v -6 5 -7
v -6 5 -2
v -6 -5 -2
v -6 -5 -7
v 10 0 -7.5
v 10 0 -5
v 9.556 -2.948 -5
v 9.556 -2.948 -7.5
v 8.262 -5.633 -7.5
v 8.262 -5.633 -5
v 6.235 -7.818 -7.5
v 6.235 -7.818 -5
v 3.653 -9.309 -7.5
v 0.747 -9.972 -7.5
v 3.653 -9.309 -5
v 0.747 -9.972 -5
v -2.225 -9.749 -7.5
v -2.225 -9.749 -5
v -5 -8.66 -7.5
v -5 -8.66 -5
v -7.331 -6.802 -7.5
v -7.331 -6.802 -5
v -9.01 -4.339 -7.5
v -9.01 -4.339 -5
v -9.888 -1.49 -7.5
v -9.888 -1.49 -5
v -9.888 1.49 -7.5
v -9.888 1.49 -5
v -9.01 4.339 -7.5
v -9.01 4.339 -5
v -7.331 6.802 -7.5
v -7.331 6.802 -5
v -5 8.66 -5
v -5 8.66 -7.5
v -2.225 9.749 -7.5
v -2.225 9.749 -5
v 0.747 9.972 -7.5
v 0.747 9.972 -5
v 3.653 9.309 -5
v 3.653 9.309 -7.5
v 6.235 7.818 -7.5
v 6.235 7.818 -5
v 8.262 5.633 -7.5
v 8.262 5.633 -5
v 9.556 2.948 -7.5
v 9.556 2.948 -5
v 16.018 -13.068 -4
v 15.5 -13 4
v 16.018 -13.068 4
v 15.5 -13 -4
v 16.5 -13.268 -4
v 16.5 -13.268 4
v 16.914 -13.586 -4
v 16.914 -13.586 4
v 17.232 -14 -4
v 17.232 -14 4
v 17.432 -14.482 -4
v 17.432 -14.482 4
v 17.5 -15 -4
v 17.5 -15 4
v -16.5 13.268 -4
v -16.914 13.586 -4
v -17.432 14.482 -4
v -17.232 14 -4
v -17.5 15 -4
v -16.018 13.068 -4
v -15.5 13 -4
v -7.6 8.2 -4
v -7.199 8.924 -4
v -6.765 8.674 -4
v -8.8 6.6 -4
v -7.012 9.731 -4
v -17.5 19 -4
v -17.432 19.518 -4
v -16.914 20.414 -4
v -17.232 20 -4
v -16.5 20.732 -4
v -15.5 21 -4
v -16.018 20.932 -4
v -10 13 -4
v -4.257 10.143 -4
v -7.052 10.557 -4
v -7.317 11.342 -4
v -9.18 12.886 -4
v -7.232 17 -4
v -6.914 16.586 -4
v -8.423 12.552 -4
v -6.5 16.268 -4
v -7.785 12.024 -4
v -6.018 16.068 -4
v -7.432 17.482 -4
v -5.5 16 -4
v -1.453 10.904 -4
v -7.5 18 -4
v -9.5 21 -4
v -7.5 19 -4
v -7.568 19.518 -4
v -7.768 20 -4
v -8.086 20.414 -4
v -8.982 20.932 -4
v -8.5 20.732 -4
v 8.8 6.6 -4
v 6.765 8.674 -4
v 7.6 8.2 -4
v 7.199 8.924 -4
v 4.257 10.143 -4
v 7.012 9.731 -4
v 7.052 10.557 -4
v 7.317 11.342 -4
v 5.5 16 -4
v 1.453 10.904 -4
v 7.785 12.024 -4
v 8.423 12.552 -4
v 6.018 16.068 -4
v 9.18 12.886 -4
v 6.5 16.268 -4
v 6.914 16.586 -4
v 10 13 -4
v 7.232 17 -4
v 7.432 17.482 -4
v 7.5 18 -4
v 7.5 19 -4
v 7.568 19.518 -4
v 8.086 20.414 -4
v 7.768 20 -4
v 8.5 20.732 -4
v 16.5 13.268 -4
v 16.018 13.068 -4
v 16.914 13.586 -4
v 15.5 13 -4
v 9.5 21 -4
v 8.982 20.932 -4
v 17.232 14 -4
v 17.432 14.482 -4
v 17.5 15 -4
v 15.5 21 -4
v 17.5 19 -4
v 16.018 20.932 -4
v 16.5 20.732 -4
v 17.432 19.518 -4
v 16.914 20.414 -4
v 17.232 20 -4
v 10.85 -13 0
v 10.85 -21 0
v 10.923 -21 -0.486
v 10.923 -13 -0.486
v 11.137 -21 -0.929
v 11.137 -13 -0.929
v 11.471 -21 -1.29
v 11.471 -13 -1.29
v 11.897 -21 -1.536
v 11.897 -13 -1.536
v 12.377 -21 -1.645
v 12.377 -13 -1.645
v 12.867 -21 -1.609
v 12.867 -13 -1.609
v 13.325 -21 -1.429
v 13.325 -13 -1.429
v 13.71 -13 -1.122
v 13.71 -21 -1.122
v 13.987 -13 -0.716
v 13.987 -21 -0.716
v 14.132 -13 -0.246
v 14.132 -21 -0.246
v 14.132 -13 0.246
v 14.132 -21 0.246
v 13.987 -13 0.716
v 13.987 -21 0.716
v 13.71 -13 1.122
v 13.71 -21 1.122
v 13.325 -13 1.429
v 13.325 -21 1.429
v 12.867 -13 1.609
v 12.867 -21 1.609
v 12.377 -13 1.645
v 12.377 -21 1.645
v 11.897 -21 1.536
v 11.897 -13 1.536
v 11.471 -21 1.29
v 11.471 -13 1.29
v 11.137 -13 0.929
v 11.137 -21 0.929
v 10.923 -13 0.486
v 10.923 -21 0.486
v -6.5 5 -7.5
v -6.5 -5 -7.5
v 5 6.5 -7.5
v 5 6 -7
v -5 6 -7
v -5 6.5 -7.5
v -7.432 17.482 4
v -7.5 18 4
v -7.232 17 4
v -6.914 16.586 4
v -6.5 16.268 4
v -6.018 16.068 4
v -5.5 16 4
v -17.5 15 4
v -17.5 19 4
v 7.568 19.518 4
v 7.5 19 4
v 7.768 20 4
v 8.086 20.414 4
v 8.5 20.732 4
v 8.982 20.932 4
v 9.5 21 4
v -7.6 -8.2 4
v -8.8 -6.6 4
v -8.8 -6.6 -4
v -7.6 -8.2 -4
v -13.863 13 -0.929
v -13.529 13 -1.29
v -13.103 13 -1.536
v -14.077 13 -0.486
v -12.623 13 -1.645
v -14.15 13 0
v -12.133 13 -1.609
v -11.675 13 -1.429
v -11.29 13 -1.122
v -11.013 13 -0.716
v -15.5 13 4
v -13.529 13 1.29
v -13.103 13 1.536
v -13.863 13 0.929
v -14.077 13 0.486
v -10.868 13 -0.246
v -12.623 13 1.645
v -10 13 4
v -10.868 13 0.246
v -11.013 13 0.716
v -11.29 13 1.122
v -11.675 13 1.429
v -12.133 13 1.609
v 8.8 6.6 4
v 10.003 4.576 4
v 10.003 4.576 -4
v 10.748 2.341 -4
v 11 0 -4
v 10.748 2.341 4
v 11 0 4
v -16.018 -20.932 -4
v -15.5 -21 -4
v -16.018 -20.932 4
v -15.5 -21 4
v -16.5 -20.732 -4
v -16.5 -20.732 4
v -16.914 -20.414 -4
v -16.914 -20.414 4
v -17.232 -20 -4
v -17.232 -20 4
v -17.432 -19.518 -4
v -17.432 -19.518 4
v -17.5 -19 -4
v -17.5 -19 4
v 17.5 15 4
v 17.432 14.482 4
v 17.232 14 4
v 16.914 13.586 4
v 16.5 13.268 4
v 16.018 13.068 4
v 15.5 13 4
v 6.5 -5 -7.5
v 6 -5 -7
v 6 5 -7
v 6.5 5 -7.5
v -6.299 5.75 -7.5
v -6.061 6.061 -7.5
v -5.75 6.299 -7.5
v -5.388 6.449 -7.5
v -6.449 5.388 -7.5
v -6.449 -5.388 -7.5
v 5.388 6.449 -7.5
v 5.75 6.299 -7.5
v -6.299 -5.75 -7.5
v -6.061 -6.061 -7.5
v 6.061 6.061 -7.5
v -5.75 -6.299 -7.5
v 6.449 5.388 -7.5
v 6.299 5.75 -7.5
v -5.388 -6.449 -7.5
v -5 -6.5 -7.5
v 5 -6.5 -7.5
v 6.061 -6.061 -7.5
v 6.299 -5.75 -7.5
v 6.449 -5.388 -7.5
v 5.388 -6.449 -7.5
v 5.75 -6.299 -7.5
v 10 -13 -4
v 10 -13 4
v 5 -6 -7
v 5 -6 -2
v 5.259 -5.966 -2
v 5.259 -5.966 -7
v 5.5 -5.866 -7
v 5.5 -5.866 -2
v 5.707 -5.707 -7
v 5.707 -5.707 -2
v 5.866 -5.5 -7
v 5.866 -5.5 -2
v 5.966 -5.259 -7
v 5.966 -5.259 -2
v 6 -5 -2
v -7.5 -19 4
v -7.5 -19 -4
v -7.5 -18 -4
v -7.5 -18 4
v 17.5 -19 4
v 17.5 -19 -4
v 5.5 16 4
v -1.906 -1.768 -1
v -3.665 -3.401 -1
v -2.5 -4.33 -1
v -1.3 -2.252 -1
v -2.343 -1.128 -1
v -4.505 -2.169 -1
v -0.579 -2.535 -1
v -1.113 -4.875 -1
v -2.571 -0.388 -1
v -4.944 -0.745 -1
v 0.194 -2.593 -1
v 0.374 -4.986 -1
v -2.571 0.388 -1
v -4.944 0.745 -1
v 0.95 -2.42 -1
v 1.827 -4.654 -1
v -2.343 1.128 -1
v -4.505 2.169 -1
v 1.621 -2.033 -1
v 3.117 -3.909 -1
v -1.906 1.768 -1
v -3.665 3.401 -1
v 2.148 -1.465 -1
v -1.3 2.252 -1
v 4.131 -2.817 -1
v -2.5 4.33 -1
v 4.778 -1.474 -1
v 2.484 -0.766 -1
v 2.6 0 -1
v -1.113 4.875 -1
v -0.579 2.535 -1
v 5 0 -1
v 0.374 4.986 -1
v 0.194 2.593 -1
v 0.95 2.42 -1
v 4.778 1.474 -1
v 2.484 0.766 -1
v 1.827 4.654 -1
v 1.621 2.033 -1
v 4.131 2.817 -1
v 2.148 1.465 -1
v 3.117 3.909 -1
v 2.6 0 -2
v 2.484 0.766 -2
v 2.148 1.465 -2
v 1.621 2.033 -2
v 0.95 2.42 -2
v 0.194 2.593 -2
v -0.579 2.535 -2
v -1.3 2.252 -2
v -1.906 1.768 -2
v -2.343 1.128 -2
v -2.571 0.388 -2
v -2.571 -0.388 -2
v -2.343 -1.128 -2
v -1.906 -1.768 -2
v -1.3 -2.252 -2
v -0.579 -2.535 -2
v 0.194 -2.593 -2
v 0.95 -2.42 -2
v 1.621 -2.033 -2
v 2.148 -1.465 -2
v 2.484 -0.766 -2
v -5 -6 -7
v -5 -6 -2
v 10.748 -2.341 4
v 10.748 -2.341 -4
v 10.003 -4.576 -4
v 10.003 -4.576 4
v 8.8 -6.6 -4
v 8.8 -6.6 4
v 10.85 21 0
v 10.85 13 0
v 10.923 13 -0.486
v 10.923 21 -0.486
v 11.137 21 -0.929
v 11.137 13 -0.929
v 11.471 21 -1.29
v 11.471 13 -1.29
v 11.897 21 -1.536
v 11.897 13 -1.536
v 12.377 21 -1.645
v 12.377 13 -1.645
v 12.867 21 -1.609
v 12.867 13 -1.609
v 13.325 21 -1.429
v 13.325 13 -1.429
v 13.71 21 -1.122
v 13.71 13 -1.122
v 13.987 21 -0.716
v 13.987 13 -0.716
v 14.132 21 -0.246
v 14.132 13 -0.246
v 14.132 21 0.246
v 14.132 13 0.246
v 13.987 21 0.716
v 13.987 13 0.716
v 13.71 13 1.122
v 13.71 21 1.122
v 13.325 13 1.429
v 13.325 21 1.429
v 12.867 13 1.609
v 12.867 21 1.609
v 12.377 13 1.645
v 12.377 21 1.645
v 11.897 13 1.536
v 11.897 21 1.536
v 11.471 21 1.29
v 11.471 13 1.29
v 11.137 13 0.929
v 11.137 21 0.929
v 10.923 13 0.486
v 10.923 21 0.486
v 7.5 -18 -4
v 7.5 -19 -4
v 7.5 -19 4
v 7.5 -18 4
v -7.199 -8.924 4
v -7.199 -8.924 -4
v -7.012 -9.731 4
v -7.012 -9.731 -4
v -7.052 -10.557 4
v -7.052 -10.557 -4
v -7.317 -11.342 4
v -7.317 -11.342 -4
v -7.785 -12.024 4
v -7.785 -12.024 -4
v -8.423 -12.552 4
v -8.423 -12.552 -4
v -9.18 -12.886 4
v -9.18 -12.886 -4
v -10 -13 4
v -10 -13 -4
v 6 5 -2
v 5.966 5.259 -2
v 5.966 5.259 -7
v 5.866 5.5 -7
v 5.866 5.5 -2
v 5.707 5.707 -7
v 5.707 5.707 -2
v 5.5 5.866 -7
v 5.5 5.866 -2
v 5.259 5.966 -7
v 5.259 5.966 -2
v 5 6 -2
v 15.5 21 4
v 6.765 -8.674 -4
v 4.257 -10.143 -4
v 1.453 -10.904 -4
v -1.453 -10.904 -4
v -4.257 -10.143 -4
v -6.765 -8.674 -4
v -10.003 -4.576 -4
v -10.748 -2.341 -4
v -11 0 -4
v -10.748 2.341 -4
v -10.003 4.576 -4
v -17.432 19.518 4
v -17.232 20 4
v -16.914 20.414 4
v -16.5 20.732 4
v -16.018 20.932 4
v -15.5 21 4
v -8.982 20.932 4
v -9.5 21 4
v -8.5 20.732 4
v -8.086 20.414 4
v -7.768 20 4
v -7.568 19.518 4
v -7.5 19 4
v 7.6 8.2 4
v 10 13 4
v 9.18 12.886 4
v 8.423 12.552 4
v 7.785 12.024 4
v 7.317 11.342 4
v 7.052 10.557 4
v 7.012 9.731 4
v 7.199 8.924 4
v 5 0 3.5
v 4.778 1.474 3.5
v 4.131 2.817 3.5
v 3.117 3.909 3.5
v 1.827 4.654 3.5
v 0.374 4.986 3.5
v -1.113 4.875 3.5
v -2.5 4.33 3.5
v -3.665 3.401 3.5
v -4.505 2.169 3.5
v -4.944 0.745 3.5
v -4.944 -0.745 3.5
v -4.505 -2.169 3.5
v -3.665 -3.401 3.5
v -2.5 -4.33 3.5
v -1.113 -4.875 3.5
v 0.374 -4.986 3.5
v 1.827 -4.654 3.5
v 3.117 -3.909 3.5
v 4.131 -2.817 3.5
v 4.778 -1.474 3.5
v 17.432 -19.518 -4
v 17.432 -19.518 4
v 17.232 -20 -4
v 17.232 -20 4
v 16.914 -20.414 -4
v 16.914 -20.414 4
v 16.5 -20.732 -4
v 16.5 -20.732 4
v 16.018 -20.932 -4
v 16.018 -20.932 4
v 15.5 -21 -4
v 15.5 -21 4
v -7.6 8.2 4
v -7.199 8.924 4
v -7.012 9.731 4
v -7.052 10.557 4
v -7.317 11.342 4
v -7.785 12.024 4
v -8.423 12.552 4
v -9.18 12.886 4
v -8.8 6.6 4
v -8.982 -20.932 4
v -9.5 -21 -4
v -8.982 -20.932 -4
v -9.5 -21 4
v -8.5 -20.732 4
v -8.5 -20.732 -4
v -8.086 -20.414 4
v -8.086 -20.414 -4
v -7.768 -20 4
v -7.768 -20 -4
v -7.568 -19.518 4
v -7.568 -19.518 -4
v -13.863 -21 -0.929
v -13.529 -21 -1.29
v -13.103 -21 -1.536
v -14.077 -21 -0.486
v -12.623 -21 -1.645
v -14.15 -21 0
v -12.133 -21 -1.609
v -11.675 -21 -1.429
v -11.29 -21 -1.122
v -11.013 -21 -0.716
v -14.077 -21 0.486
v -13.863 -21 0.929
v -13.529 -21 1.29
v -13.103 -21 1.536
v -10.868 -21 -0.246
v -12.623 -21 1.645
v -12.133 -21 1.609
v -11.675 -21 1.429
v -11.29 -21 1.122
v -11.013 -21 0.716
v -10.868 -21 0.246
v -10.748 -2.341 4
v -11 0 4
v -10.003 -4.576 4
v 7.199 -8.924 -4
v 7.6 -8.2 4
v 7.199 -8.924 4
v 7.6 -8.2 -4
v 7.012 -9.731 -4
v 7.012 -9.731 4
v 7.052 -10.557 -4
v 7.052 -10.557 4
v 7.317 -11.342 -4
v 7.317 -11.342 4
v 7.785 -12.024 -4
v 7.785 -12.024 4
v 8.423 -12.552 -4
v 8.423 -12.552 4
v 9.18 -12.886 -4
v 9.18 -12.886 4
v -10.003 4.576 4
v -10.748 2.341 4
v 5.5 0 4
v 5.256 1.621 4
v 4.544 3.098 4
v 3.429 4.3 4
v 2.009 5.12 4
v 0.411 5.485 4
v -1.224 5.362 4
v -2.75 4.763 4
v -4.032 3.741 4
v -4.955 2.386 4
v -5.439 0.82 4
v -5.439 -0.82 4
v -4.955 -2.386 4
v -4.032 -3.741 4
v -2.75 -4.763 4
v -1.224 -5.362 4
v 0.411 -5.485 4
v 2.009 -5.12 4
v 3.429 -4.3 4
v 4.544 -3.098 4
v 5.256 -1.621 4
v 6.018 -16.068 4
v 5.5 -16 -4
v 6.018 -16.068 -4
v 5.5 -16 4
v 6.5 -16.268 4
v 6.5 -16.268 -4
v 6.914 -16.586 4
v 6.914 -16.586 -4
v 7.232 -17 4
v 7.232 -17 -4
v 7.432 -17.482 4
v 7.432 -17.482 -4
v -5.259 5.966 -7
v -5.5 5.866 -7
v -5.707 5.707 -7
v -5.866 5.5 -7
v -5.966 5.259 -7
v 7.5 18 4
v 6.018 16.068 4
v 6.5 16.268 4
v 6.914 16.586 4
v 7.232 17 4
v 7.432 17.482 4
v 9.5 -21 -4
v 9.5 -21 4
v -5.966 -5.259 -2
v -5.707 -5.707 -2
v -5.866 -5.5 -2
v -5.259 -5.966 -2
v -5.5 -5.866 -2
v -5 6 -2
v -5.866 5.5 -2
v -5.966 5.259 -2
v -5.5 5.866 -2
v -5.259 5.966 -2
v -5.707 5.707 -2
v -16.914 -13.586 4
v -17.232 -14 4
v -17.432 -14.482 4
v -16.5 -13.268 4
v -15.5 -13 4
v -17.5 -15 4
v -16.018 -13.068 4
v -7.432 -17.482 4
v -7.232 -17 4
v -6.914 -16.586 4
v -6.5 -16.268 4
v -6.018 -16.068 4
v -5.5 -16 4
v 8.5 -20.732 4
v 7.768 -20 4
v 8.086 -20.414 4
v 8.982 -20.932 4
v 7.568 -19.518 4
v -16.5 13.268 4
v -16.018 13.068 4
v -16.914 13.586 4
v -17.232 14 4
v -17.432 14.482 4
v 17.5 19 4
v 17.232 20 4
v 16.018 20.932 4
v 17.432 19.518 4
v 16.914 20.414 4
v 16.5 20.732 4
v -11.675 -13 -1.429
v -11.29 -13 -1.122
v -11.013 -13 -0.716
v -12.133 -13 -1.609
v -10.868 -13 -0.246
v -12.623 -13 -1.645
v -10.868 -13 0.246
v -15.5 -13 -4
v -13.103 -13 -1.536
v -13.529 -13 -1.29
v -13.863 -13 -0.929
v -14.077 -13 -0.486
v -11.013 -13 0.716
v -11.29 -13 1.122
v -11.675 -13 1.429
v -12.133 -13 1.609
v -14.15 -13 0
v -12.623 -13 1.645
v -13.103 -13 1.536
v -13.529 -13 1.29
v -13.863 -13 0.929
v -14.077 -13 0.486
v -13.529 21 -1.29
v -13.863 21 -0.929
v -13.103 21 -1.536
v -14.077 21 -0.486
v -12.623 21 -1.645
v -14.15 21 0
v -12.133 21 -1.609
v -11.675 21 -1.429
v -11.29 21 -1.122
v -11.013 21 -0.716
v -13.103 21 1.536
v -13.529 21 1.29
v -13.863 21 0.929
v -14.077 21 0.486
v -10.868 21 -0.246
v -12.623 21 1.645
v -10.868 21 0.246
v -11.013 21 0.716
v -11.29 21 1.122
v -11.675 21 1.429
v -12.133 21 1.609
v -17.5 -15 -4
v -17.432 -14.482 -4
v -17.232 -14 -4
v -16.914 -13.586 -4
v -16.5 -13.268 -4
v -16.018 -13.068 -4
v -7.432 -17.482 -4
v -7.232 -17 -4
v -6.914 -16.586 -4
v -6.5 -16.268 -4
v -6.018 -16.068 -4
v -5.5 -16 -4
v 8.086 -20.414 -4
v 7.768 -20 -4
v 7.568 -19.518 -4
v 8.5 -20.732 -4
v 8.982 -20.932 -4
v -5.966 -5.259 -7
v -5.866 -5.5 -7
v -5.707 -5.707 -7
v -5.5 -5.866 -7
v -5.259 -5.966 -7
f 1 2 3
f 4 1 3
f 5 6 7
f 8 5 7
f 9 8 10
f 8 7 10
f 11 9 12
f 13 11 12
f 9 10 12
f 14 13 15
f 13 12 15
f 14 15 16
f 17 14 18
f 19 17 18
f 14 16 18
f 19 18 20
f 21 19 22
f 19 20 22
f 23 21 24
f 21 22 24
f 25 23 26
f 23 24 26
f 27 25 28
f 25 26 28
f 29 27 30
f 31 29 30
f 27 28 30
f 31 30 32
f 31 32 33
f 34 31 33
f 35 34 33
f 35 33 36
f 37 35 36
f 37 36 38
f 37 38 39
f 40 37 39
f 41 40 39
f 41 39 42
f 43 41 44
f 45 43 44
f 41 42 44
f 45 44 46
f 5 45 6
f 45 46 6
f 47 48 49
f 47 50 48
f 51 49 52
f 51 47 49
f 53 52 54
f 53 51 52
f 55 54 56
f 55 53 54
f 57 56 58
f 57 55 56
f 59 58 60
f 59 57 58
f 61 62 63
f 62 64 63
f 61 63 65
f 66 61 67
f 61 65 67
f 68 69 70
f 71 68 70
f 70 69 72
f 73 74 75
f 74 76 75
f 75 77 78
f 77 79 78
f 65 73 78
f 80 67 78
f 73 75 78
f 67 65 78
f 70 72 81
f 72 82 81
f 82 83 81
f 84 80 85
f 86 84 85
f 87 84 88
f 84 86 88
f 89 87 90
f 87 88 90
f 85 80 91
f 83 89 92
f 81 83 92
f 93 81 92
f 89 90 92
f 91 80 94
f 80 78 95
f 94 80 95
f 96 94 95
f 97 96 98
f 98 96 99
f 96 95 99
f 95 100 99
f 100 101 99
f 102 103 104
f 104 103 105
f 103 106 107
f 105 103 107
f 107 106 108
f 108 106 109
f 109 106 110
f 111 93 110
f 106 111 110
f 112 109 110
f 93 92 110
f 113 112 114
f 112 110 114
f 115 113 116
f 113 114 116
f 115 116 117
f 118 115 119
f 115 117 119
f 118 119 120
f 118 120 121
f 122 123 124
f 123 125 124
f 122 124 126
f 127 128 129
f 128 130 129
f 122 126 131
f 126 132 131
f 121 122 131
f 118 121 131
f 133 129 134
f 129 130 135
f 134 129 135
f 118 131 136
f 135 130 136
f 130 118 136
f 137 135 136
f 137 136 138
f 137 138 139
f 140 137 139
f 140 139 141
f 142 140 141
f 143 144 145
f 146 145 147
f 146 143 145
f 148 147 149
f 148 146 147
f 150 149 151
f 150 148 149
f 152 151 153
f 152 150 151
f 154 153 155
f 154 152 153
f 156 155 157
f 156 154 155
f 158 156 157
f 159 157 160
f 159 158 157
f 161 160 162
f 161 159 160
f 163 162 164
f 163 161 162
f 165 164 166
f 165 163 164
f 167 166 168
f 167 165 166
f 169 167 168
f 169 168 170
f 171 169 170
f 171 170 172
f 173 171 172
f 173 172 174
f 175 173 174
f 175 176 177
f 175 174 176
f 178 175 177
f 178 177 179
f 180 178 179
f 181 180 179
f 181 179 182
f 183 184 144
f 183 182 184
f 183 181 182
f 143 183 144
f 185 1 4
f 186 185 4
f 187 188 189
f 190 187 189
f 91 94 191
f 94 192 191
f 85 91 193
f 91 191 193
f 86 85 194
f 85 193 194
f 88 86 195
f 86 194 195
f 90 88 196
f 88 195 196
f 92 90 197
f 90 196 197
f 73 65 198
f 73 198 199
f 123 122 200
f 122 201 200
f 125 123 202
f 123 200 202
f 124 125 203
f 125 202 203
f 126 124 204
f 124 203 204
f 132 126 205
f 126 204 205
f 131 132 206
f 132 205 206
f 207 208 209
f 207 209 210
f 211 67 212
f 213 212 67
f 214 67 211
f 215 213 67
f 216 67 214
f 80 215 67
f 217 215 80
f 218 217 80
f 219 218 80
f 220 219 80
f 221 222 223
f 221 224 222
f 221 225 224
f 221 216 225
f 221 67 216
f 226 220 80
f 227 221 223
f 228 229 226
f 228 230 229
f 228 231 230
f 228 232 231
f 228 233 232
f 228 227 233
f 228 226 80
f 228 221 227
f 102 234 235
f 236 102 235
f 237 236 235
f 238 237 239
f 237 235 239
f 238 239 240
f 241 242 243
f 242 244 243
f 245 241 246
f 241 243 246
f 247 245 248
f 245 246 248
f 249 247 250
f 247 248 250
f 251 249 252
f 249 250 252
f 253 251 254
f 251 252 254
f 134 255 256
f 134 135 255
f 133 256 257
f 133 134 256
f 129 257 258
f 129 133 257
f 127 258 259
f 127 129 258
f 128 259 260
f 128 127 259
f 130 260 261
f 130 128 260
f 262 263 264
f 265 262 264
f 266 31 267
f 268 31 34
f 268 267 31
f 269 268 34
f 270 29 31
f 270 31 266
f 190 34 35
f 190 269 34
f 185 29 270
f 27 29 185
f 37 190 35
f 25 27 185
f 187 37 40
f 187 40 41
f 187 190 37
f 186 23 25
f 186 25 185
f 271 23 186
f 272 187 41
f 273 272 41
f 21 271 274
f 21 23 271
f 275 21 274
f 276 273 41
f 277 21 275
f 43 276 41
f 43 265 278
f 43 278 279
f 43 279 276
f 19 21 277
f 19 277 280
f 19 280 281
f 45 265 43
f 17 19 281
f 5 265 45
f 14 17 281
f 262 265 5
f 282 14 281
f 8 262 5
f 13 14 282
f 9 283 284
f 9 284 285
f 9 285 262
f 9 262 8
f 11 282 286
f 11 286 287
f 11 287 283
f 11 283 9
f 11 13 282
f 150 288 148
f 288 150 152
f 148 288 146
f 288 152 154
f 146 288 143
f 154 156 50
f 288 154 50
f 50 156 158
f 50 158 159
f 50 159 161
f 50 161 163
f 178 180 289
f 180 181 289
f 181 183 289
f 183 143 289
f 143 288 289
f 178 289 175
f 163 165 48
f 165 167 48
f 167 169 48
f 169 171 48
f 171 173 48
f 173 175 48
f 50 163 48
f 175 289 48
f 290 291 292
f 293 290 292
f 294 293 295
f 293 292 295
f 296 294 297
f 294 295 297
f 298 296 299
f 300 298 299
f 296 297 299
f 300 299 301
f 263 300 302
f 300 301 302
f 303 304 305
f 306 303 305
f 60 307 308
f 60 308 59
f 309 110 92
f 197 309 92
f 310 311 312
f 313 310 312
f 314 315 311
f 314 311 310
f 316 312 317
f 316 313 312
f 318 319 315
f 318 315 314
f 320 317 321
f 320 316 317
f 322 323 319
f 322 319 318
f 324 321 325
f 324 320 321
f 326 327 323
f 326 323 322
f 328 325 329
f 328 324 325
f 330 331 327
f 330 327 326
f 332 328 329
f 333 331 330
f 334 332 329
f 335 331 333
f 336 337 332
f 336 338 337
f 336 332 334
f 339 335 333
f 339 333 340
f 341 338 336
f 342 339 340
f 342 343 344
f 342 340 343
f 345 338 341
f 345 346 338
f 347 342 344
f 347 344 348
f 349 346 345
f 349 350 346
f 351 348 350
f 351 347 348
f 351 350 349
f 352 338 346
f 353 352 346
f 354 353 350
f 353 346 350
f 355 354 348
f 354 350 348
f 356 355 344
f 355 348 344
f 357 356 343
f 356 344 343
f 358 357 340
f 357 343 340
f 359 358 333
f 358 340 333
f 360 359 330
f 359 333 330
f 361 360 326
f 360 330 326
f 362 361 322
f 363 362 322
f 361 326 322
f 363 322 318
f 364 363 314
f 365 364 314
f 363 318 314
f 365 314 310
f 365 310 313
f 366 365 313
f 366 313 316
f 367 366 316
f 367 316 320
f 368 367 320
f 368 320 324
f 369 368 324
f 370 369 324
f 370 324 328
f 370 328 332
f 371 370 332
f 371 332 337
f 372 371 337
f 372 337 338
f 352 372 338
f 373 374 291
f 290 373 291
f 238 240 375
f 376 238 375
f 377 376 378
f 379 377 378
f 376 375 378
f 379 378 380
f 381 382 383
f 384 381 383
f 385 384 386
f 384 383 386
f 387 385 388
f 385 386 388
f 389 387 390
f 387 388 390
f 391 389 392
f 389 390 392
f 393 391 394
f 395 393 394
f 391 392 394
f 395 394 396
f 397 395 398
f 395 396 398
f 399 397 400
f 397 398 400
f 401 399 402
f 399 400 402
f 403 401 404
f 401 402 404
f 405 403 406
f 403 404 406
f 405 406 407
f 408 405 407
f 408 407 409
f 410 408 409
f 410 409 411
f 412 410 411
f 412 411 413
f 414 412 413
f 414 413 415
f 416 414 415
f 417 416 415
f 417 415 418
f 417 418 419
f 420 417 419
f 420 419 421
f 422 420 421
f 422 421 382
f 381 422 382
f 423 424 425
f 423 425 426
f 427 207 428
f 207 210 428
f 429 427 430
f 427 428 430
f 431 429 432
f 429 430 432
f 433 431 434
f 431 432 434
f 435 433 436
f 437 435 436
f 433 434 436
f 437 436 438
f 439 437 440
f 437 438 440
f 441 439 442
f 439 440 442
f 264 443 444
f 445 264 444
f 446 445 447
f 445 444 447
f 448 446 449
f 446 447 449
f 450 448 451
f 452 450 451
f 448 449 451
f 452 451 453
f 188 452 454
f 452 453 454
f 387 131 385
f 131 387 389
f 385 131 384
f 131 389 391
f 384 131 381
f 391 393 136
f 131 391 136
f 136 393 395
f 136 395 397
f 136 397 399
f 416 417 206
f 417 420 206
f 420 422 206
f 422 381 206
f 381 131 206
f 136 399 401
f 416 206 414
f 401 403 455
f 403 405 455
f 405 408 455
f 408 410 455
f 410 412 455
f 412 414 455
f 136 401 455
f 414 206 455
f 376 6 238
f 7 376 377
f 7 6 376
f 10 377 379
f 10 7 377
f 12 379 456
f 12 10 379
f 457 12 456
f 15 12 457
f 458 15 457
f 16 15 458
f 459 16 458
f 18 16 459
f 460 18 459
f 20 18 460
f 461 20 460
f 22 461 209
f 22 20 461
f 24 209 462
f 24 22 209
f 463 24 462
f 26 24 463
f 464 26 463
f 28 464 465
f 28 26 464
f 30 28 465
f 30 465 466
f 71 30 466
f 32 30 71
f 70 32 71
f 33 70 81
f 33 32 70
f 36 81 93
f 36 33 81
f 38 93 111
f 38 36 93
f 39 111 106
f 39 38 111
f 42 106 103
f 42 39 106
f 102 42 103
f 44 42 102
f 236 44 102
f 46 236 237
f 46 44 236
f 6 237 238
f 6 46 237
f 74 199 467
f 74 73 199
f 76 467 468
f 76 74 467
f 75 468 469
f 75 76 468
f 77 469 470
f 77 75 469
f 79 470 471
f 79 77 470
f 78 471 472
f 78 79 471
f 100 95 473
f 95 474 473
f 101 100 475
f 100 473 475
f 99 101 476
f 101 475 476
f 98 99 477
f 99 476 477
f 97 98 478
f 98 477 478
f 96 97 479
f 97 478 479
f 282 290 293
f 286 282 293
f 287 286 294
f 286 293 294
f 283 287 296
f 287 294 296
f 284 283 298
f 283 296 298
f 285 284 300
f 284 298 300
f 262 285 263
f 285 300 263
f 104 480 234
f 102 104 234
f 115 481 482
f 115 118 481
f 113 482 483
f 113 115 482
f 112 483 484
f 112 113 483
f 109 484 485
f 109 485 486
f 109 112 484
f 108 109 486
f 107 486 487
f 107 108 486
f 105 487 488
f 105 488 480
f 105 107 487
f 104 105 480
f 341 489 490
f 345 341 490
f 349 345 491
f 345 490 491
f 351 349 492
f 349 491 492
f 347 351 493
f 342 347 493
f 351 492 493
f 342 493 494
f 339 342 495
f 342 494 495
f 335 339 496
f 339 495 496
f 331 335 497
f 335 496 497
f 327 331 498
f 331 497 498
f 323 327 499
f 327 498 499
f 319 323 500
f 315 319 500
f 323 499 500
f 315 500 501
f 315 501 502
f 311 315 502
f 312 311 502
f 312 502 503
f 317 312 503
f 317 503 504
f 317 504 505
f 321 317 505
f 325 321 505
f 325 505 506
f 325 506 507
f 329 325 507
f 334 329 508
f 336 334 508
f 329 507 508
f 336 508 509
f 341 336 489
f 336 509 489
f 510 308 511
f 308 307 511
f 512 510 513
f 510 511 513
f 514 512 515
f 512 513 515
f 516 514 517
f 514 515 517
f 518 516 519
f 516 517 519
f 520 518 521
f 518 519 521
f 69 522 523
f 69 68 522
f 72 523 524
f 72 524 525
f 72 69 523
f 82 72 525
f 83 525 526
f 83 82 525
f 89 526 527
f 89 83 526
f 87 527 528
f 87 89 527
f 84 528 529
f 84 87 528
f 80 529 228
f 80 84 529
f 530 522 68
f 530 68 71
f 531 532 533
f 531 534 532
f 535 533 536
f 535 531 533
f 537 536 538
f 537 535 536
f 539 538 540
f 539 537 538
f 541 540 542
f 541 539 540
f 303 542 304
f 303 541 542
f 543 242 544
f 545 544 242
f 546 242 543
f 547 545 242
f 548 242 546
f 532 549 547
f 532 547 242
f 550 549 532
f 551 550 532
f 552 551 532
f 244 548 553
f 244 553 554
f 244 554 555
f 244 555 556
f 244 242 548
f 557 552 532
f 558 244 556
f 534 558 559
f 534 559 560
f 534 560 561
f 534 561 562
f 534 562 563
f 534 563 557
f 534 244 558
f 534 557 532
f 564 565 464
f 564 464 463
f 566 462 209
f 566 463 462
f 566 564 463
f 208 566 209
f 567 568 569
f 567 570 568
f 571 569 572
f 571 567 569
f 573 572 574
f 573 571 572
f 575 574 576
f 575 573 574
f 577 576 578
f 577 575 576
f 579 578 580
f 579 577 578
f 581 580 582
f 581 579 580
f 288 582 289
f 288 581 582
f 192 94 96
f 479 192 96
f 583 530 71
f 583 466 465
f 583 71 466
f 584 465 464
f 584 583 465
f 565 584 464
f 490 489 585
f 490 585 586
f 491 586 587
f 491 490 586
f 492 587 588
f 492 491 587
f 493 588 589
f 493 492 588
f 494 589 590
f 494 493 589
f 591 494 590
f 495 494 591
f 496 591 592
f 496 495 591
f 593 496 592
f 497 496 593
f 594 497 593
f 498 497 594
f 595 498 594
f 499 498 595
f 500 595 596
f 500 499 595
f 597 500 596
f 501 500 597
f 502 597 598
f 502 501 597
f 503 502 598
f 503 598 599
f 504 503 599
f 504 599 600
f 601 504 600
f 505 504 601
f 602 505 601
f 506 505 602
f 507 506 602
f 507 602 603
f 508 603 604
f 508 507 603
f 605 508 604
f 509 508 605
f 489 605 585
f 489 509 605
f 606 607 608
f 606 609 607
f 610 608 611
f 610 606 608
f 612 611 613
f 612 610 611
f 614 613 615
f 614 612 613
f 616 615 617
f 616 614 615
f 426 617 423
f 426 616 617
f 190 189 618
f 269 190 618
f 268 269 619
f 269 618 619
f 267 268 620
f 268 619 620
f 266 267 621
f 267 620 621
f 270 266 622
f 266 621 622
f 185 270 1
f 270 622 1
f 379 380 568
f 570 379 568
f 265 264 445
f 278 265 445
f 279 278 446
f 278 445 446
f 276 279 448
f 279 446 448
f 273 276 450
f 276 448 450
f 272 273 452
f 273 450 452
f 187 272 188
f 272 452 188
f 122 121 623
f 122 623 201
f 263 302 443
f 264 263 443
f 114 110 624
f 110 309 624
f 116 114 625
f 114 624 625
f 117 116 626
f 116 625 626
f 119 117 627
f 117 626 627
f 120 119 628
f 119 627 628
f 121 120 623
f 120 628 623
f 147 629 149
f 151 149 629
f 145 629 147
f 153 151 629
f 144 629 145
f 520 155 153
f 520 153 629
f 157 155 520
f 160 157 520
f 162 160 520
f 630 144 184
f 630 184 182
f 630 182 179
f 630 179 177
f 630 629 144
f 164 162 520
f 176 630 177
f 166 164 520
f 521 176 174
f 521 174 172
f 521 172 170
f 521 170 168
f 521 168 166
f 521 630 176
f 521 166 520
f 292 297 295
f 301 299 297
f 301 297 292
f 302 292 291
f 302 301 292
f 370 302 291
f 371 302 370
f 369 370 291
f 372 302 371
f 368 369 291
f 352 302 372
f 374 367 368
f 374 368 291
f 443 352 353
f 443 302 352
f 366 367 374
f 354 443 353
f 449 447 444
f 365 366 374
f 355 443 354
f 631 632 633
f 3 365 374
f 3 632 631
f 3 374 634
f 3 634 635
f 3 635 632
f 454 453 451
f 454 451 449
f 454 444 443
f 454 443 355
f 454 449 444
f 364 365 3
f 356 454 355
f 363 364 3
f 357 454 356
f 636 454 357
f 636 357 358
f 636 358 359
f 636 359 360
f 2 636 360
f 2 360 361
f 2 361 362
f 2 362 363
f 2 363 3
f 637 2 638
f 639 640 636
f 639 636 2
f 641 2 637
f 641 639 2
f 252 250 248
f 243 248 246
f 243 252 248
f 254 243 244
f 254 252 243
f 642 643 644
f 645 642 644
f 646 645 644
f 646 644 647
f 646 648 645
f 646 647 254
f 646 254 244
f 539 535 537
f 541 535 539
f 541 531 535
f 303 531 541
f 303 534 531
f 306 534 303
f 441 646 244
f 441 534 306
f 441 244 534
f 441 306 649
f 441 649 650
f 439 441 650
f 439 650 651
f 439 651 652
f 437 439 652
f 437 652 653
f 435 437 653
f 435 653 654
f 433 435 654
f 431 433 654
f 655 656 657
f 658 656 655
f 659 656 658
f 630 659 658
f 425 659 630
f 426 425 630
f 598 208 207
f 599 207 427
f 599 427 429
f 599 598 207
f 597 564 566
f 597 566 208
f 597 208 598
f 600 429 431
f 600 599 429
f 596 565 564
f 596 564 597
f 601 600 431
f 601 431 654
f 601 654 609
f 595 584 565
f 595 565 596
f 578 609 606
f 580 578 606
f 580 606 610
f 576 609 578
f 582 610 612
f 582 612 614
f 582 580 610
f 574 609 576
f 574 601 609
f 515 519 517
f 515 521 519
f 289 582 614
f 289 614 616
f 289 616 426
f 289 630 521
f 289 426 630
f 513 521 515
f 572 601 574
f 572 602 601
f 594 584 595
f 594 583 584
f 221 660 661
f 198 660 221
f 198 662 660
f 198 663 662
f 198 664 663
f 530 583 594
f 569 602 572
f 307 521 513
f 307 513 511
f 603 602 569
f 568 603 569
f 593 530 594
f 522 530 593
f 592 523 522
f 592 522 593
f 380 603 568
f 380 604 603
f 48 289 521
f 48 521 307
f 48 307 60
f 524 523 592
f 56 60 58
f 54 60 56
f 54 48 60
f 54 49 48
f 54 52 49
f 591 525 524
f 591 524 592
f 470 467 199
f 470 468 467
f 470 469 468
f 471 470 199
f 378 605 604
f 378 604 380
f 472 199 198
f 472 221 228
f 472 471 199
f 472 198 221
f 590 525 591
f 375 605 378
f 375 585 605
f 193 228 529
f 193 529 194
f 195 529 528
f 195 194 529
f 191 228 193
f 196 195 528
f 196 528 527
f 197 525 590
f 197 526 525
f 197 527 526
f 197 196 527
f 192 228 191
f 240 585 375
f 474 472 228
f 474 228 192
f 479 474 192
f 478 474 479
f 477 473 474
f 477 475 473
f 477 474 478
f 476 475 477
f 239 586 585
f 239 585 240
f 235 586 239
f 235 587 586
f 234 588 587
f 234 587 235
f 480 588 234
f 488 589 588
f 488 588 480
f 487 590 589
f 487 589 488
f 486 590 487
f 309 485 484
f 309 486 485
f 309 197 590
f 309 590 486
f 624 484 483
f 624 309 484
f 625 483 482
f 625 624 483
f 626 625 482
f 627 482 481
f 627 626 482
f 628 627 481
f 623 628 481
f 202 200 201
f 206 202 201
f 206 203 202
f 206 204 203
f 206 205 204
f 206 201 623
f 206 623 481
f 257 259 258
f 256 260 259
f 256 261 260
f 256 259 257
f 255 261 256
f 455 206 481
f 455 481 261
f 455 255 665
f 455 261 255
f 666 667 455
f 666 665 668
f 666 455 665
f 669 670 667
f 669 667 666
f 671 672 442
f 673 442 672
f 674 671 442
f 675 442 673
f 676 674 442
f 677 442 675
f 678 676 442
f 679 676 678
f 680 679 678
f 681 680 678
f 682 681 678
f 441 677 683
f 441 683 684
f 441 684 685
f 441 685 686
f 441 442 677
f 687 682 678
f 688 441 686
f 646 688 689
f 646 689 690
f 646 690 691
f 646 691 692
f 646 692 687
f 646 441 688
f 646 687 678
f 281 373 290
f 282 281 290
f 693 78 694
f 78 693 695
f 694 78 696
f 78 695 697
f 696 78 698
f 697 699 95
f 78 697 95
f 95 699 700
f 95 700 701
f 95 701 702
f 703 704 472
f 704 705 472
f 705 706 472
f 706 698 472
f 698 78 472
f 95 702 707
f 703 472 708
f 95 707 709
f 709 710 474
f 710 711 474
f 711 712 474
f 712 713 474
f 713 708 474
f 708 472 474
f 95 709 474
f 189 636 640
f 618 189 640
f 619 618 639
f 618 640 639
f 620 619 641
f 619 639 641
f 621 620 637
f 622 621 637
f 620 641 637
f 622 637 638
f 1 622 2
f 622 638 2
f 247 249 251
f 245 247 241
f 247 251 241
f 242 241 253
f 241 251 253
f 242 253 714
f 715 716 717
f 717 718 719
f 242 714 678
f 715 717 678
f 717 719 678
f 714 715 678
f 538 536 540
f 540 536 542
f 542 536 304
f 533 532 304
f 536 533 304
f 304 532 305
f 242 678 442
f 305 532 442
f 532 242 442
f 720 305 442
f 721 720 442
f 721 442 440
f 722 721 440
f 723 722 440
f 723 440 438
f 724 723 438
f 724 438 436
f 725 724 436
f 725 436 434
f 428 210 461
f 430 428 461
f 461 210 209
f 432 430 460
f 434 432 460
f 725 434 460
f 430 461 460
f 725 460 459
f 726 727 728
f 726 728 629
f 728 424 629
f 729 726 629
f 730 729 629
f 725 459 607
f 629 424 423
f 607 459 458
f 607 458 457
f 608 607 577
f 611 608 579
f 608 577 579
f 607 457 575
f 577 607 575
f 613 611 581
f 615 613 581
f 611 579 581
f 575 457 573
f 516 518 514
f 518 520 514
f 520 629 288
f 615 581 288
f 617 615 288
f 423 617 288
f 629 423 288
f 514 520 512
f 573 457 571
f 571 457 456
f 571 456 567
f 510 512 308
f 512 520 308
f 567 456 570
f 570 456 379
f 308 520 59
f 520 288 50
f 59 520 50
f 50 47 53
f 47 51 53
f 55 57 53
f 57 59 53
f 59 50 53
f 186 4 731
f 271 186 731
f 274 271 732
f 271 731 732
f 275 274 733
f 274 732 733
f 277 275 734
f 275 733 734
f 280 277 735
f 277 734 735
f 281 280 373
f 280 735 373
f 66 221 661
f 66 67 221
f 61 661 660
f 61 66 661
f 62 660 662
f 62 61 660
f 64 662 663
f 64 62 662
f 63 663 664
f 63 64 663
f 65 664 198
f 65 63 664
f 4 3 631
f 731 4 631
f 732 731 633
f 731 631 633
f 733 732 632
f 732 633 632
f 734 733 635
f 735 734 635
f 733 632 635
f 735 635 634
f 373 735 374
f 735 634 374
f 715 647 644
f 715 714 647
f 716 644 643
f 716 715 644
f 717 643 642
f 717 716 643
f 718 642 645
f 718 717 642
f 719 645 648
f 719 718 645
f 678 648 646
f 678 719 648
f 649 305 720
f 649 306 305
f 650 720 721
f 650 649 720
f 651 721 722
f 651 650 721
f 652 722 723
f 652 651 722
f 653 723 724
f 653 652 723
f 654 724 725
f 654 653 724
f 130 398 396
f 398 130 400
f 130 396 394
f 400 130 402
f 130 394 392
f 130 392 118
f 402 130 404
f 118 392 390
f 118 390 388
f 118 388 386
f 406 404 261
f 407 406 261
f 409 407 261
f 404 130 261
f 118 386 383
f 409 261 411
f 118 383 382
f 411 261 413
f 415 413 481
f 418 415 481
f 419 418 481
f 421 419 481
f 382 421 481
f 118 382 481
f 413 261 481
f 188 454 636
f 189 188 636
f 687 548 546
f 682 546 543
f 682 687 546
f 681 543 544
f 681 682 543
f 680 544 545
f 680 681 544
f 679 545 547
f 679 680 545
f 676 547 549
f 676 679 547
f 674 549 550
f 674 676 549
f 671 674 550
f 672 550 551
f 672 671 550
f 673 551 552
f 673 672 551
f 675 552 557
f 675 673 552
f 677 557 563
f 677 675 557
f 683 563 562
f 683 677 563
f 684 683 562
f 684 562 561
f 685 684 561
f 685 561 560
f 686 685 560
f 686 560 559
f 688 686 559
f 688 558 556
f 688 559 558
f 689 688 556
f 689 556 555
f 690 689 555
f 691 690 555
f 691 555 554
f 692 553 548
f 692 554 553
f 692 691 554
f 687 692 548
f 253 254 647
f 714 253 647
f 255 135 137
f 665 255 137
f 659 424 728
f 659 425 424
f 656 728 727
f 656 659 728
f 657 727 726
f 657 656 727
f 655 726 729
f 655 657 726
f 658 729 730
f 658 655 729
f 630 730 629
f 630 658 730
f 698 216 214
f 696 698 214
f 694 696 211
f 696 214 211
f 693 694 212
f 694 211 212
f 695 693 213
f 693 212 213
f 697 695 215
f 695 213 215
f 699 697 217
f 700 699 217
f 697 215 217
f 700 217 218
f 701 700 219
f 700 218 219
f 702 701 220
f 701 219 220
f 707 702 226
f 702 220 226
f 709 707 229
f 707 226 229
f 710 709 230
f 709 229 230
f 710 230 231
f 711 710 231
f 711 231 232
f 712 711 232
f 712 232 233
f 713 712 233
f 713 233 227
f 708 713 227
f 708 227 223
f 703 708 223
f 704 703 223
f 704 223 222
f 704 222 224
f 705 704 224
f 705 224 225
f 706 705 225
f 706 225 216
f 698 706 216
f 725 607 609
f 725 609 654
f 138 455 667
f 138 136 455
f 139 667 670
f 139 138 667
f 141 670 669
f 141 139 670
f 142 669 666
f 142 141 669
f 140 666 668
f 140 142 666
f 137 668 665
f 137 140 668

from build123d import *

# Parameters (mm, degrees)
SKETCH_1_W             = 35
SKETCH_1_H             = 42
EXTRUDE_1_DEPTH        = 4
SKETCH_4_R             = 10
EXTRUDE_2_DEPTH        = 3.5
CUT_EXTRUDE_START      = -2
CUT_EXTRUDE_2_DEPTH    = 2
SKETCH_6_R             = 2.6
CUT_EXTRUDE_3_DEPTH    = 30.656365253
SKETCH_7_R             = 5
CUT_EXTRUDE_4_DEPTH    = 5
CHAMFER_1_SIZE         = 0.5
CHAMFER_2_SIZE         = 0.5
CHAMFER_3_SIZE         = 1
CUT_EXTRUDE_5_DEPTH    = 30.656365253
FILLET_1_R             = 3
HOLE_WIZARD_M4_1_D     = 3.3
HOLE_WIZARD_M4_1_DEPTH = 8
SKETCH_14_W            = 15
SKETCH_14_H            = 5
CUT_EXTRUDE_6_DEPTH    = 29.482450737
FILLET_2_R             = 2
FILLET_3_R             = 2


with BuildPart() as part:
    # 草图1 → 凸台-拉伸1 (new, symmetric)
    with BuildSketch(Plane.XY):
        Rectangle(SKETCH_1_W, SKETCH_1_H)
    extrude(amount=EXTRUDE_1_DEPTH, both=True)

    # 草图4 → 凸台-拉伸2 (add)
    with BuildSketch(Plane(origin=(0, 0, -4), x_dir=(-1, 0, 0), z_dir=(0, 0, -1))):
        with Locations(Location((0, 0, 0), (0, 0, 180))):
            Circle(SKETCH_4_R)
        with BuildLine():
            Line((-5, 6), (5, 6))
            ThreePointArc((5, 6), (5.707106781, 5.707106781), (6, 5))
            Line((6, 5), (6, -5))
            ThreePointArc((6, -5), (5.707106781, -5.707106781), (5, -6))
            Line((5, -6), (-5, -6))
            ThreePointArc((-5, -6), (-5.707106781, -5.707106781), (-6, -5))
            Line((-6, -5), (-6, 5))
            ThreePointArc((-6, 5), (-5.707106781, 5.707106781), (-5, 6))
        make_face(mode=Mode.SUBTRACT)
    extrude(amount=EXTRUDE_2_DEPTH)

    # 草图5 → 切除-拉伸2 (cut)
    with BuildSketch(Plane(origin=(0, 0, -4), x_dir=(-1, 0, 0), z_dir=(0, 0, -1)).offset(CUT_EXTRUDE_START)):
        with BuildLine():
            Line((6, -5), (6, 5))
            ThreePointArc((6, 5), (5.707106781, 5.707106781), (5, 6))
            Line((5, 6), (-5, 6))
            ThreePointArc((-5, 6), (-5.707106781, 5.707106781), (-6, 5))
            Line((-6, 5), (-6, -5))
            ThreePointArc((-6, -5), (-5.707106781, -5.707106781), (-5, -6))
            Line((-5, -6), (5, -6))
            ThreePointArc((5, -6), (5.707106781, -5.707106781), (6, -5))
        make_face()
    extrude(amount=CUT_EXTRUDE_2_DEPTH, mode=Mode.SUBTRACT)

    # 草图6 → 切除-拉伸3 (cut, through all)
    with BuildSketch(Plane.XY.offset(4)):
        Circle(SKETCH_6_R)
    extrude(amount=-CUT_EXTRUDE_3_DEPTH, mode=Mode.SUBTRACT)

    # 草图7 → 切除-拉伸4 (cut)
    with BuildSketch(Plane.XY.offset(4)):
        Circle(SKETCH_7_R)
    extrude(amount=-CUT_EXTRUDE_4_DEPTH, mode=Mode.SUBTRACT)

    # 倒角1
    chamfer_1_edges = [part.edges().sort_by_distance(p)[0] for p in [
        (-5.707106781, 5.707106781, -7.5),
        (0, 6, -7.5),
        (5.707106781, 5.707106781, -7.5),
        (6, 0, -7.5),
        (5.707106781, -5.707106781, -7.5),
        (0, -6, -7.5),
        (-5.707106781, -5.707106781, -7.5),
        (-6, 0, -7.5),
    ]]
    chamfer(chamfer_1_edges, length=CHAMFER_1_SIZE)

    # 倒角2
    chamfer_2_edges = [part.edges().sort_by_distance(p)[0] for p in [
        (-5, 0, 4),
    ]]
    chamfer(chamfer_2_edges, length=CHAMFER_2_SIZE)

    # 倒角3
    chamfer_3_edges = [part.edges().sort_by_distance(p)[0] for p in [
        (-10, 0, -4),
    ]]
    chamfer(chamfer_3_edges, length=CHAMFER_3_SIZE)

    # 草图10 → 切除-拉伸5 (cut, through all)
    with BuildSketch(Plane.XY.offset(4)):
        Polygon((11, -13), (17.5, -13), (17.5, 13), (11, 13), (11, 0), align=None)
        with BuildLine():
            ThreePointArc((8.8, 6.6), (10.435516279, 3.478505426), (11, 0))
            Line((11, 0), (11, 13))
            Line((11, 13), (4, 13))
            Line((4, 13), (8.8, 6.6))
        make_face()
        with BuildLine():
            Line((4, -13), (11, -13))
            Line((11, -13), (11, 0))
            ThreePointArc((11, 0), (10.435516279, -3.478505426), (8.8, -6.6))
            Line((8.8, -6.6), (4, -13))
        make_face()
    cut_extrude_5 = extrude(amount=-CUT_EXTRUDE_5_DEPTH, mode=Mode.SUBTRACT)

    # 镜向1: 切除-拉伸5 across plane
    add(cut_extrude_5.mirror(Plane(origin=(0, 0, 0), x_dir=(0, 0, 1), z_dir=(1, 0, 0))), mode=Mode.SUBTRACT)

    # 圆角1
    fillet_1_edges = [part.edges().sort_by_distance(p)[0] for p in [
        (4, 13, 0),
        (4, -13, 0),
        (-4, -13, 0),
        (-4, 13, 0),
    ]]
    fillet(fillet_1_edges, radius=FILLET_1_R)

    # M4 螺纹孔1
    with Locations(Plane(origin=(0, 21, 0), x_dir=(1, 0, 0), z_dir=(0, 1, 0))):
        with Locations((12.5, 0), (-12.5, 0)):
            hole_wizard_m4_1 = Hole(HOLE_WIZARD_M4_1_D / 2, depth=HOLE_WIZARD_M4_1_DEPTH)

    # 镜向2: M4 螺纹孔1 across plane
    add(hole_wizard_m4_1.mirror(Plane.ZX), mode=Mode.SUBTRACT)

    # 草图14 → 切除-拉伸6 (cut, through all)
    with BuildSketch(Plane(origin=(0, 0, -4), x_dir=(-1, 0, 0), z_dir=(0, 0, -1))):
        with Locations((0, 18.5)):
            Rectangle(SKETCH_14_W, SKETCH_14_H)
        with Locations((0, -18.5)):
            Rectangle(SKETCH_14_W, SKETCH_14_H)
    extrude(amount=-CUT_EXTRUDE_6_DEPTH, mode=Mode.SUBTRACT)

    # 圆角2
    fillet_2_edges = [part.edges().sort_by_distance(p)[0] for p in [
        (17.5, 13, 0),
        (17.5, -13, 0),
        (-17.5, 13, 0),
        (-17.5, -13, 0),
        (17.5, -21, 0),
        (-17.5, -21, 0),
        (-17.5, 21, 0),
        (17.5, 21, 0),
    ]]
    fillet(fillet_2_edges, radius=FILLET_2_R)

    # 圆角3
    fillet_3_edges = [part.edges().sort_by_distance(p)[0] for p in [
        (7.5, 16, 0),
        (7.5, 21, 0),
        (-7.5, 21, 0),
        (-7.5, 16, 0),
        (7.5, -16, 0),
        (-7.5, -16, 0),
        (-7.5, -21, 0),
        (7.5, -21, 0),
    ]]
    fillet(fillet_3_edges, radius=FILLET_3_R)


solid = part.part
